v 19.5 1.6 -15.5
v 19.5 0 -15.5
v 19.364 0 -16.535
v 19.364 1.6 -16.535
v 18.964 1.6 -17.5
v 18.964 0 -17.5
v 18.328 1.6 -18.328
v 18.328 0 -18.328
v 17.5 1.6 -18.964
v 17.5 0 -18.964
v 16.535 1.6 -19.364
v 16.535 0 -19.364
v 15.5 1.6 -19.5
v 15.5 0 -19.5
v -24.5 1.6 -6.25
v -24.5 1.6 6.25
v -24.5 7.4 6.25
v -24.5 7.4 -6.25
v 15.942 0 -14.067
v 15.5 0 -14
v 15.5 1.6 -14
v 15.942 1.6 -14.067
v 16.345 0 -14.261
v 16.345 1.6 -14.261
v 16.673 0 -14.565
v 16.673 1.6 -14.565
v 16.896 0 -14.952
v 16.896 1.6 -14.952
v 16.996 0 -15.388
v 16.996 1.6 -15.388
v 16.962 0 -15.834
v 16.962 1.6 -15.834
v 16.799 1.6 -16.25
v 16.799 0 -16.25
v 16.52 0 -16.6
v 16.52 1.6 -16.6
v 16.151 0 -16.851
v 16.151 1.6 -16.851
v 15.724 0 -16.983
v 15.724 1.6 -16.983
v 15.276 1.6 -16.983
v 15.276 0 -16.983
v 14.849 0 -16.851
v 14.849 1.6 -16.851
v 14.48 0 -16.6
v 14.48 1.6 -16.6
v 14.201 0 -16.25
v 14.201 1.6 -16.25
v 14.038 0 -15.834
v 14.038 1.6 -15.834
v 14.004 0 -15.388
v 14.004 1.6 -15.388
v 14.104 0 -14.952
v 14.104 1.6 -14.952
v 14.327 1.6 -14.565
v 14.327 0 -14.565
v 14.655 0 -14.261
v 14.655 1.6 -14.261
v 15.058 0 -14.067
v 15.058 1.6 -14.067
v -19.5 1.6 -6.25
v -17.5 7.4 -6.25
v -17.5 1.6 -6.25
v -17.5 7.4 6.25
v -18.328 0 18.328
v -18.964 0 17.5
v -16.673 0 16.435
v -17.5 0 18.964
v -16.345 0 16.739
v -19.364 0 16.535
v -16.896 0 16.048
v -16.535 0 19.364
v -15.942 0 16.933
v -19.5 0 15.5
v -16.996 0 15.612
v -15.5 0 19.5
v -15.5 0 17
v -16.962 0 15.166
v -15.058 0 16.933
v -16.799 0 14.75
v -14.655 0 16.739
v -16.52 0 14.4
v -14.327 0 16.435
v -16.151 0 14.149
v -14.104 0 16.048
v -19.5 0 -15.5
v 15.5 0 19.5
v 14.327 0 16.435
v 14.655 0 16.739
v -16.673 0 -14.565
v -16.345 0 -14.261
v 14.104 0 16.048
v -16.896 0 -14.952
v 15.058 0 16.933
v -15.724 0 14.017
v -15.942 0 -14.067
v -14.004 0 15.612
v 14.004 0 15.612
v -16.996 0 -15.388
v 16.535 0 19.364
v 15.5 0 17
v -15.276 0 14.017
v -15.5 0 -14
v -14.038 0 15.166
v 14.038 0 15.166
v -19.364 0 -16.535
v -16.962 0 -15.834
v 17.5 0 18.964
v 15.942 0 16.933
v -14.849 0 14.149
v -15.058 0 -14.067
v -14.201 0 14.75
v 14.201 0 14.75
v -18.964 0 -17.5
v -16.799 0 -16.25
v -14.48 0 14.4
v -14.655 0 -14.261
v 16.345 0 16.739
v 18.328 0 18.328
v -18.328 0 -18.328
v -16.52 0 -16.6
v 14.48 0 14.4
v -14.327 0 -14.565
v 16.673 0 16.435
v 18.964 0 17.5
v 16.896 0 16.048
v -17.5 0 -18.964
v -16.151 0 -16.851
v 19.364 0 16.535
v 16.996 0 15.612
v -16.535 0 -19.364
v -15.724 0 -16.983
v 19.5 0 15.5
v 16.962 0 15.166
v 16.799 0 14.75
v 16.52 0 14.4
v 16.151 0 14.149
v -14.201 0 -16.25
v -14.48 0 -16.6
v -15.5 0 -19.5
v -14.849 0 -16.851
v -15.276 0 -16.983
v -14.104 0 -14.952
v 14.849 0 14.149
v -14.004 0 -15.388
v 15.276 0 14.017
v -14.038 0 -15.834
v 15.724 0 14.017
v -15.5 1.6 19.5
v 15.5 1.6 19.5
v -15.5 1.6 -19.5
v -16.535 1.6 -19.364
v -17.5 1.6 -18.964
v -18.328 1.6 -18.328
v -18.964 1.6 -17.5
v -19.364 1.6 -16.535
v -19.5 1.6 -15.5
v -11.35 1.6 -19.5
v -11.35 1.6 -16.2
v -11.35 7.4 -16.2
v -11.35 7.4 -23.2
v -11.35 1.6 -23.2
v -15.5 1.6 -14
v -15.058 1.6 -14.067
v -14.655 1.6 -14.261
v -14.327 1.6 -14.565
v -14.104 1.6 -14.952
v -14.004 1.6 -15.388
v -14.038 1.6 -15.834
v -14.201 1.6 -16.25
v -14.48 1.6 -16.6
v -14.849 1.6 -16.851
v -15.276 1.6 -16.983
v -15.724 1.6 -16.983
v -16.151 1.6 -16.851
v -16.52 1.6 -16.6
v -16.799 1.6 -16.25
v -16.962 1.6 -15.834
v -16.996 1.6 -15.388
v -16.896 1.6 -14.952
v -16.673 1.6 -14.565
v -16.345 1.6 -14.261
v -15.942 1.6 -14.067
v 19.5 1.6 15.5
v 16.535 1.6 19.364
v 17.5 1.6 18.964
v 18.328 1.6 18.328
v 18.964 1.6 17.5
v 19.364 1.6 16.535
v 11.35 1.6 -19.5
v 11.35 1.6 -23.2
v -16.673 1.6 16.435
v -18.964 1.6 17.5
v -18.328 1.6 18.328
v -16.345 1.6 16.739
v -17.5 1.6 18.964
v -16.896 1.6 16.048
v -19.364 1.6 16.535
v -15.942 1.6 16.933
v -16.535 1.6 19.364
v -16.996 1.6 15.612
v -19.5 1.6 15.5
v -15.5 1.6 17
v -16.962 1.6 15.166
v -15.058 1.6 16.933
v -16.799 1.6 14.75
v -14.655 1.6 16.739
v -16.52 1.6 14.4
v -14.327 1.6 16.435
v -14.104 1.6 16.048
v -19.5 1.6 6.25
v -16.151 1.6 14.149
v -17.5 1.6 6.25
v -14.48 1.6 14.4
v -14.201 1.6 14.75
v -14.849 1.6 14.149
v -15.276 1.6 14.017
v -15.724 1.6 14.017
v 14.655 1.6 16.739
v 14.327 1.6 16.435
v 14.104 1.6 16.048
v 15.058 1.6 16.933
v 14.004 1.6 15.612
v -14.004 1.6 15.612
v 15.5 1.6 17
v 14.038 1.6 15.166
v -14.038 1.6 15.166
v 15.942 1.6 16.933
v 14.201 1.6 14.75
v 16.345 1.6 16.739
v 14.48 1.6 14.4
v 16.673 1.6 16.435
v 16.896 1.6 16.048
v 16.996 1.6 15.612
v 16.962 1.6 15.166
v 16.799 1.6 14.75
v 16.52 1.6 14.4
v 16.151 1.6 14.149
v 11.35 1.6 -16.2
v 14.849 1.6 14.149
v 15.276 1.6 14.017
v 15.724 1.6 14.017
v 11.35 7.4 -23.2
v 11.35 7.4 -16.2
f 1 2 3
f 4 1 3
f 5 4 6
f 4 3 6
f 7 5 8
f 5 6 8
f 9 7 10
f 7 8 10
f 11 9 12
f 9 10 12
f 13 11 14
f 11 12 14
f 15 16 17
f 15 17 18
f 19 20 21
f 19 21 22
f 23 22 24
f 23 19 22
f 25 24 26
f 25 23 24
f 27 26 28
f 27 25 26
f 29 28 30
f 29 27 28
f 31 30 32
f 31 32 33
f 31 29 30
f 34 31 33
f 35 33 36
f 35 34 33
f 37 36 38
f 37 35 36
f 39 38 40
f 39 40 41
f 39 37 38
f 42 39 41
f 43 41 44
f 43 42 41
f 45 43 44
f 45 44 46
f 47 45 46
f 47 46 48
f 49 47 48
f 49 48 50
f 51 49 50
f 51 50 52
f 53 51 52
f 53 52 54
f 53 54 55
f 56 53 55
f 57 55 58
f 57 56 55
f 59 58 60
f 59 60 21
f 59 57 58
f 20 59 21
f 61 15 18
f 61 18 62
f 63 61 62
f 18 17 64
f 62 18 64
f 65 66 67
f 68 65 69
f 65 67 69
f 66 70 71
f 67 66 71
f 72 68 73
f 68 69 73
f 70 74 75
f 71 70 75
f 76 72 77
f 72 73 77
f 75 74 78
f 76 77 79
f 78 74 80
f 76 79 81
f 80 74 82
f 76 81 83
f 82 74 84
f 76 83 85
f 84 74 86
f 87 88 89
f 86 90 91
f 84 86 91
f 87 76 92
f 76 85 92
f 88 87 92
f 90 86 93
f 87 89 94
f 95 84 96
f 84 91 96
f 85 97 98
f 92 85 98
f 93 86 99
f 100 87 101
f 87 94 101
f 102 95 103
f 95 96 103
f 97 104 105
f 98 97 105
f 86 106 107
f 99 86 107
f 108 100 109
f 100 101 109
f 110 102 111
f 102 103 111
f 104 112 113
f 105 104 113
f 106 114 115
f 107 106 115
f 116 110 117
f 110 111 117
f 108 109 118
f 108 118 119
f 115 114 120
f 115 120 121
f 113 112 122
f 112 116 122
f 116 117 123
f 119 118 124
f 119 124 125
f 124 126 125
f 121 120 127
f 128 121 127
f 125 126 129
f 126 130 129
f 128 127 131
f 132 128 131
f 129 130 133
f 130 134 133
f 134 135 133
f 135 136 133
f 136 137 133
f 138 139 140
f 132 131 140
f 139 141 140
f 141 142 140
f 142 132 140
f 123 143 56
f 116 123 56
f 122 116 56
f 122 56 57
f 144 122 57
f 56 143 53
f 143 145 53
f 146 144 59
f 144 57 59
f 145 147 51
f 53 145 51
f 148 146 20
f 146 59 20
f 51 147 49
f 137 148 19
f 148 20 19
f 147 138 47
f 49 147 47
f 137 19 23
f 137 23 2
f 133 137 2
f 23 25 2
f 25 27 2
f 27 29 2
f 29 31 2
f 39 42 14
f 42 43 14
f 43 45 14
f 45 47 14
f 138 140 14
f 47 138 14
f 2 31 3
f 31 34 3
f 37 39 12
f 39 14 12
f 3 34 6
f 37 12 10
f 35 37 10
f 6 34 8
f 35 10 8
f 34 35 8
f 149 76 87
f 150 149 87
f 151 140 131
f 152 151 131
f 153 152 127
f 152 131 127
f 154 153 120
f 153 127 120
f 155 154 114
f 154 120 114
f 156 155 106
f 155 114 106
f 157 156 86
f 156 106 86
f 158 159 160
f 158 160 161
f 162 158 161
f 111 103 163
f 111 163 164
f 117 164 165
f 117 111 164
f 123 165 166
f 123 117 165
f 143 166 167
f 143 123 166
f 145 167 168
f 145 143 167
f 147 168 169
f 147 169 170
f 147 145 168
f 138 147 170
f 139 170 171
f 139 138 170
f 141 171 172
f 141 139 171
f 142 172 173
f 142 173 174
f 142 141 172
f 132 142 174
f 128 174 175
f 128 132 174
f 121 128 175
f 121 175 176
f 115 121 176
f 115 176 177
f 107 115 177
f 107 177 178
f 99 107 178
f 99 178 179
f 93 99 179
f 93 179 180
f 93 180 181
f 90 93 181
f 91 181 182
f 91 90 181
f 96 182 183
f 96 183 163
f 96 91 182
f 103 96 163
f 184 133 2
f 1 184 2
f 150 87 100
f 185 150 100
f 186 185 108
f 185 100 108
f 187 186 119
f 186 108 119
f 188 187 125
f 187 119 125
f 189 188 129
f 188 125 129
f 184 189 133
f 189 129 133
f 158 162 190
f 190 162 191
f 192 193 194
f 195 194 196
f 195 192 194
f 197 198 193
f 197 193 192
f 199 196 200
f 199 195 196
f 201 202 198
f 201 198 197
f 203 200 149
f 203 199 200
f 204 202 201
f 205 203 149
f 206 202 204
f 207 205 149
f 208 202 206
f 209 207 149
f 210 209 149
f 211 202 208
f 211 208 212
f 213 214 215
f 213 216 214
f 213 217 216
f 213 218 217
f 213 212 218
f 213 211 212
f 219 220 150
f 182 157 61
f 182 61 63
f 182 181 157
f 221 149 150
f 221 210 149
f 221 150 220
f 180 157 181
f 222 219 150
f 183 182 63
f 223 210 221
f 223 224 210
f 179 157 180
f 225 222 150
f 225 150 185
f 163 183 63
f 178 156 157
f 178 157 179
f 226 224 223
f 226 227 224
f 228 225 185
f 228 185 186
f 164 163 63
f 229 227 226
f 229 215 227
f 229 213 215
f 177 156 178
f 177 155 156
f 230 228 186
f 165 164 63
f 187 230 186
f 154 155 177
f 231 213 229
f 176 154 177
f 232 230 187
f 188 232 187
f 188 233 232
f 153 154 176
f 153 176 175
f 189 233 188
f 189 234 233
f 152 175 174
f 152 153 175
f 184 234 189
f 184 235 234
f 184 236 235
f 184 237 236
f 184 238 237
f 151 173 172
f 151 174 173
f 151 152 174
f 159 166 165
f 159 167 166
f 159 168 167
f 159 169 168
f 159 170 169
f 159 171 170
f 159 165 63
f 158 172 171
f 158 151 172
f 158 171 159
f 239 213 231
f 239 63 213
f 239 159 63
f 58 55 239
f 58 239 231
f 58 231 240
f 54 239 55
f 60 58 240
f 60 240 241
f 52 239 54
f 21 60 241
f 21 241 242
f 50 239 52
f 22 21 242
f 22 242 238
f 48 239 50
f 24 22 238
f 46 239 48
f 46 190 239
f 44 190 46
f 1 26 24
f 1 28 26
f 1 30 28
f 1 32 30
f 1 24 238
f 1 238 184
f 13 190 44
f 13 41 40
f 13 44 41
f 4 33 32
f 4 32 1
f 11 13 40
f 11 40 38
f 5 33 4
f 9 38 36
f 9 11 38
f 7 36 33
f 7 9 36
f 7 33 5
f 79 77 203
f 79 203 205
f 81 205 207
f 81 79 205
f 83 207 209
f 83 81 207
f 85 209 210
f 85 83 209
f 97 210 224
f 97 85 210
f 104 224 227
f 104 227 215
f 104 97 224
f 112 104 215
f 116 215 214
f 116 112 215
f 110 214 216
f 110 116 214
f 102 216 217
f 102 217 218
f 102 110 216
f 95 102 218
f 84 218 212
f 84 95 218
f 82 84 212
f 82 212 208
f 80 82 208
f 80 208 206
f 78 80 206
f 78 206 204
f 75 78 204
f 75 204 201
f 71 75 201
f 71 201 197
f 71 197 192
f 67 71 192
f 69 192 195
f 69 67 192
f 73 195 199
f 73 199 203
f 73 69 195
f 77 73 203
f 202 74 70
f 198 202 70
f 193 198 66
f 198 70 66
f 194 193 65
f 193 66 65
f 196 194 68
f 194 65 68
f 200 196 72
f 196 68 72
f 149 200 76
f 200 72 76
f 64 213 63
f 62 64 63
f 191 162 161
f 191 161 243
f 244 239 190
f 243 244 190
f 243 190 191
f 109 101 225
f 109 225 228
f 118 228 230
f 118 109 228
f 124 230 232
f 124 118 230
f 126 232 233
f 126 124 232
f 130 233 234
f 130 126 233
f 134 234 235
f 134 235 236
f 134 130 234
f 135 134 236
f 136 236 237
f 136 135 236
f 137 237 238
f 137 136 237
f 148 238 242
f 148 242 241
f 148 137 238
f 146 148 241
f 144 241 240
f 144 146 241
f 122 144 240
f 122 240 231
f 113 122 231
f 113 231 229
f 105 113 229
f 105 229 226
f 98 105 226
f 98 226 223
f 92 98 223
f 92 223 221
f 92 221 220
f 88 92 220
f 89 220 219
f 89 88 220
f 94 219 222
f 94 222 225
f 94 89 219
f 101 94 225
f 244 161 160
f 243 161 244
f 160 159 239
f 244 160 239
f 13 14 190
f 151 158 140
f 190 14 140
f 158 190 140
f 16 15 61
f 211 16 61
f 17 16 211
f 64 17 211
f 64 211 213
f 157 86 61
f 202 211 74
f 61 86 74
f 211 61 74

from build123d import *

# Parameters (mm, degrees)
SKETCH_1_R      = 1.5
EXTRUDE_1_DEPTH = 1.6
EXTRUDE_START   = 1.6
SKETCH_2_W      = 22.7
SKETCH_2_H      = 7
SKETCH_2_W_2    = 7
SKETCH_2_H_2    = 12.5
EXTRUDE_2_DEPTH = 5.8


with BuildPart() as part:
    # 草图1 → 凸台-拉伸1 (new body)
    with BuildSketch(Plane(origin=(0, 0, 0), x_dir=(1, 0, 0), z_dir=(0, 1, 0))):
        with BuildLine():
            Line((-15.5, -19.5), (15.5, -19.5))
            ThreePointArc((15.5, -19.5), (18.328427125, -18.328427125), (19.5, -15.5))
            Line((19.5, -15.5), (19.5, 15.5))
            ThreePointArc((19.5, 15.5), (18.328427125, 18.328427125), (15.5, 19.5))
            Line((15.5, 19.5), (-15.5, 19.5))
            ThreePointArc((-15.5, 19.5), (-18.328427125, 18.328427125), (-19.5, 15.5))
            Line((-19.5, 15.5), (-19.5, -15.5))
            ThreePointArc((-19.5, -15.5), (-18.328427125, -18.328427125), (-15.5, -19.5))
        make_face()
        with Locations(Location((-15.5, -15.5, 0), (0, 0, 270))):
            Circle(SKETCH_1_R, mode=Mode.SUBTRACT)
        with Locations(Location((15.5, -15.5, 0), (0, 0, 270))):
            Circle(SKETCH_1_R, mode=Mode.SUBTRACT)
        with Locations(Location((-15.5, 15.5, 0), (0, 0, 270))):
            Circle(SKETCH_1_R, mode=Mode.SUBTRACT)
        with Locations(Location((15.5, 15.5, 0), (0, 0, 270))):
            Circle(SKETCH_1_R, mode=Mode.SUBTRACT)
    extrude(amount=EXTRUDE_1_DEPTH)

    # 草图2 → 凸台-拉伸2 (add)
    with BuildSketch(Plane(origin=(0, 0, 0), x_dir=(1, 0, 0), z_dir=(0, 1, 0)).offset(EXTRUDE_START)):
        with Locations((0, 19.7)):
            Rectangle(SKETCH_2_W, SKETCH_2_H)
        with Locations((-21, 0)):
            Rectangle(SKETCH_2_W_2, SKETCH_2_H_2)
    extrude(amount=EXTRUDE_2_DEPTH)


solid = part.part
